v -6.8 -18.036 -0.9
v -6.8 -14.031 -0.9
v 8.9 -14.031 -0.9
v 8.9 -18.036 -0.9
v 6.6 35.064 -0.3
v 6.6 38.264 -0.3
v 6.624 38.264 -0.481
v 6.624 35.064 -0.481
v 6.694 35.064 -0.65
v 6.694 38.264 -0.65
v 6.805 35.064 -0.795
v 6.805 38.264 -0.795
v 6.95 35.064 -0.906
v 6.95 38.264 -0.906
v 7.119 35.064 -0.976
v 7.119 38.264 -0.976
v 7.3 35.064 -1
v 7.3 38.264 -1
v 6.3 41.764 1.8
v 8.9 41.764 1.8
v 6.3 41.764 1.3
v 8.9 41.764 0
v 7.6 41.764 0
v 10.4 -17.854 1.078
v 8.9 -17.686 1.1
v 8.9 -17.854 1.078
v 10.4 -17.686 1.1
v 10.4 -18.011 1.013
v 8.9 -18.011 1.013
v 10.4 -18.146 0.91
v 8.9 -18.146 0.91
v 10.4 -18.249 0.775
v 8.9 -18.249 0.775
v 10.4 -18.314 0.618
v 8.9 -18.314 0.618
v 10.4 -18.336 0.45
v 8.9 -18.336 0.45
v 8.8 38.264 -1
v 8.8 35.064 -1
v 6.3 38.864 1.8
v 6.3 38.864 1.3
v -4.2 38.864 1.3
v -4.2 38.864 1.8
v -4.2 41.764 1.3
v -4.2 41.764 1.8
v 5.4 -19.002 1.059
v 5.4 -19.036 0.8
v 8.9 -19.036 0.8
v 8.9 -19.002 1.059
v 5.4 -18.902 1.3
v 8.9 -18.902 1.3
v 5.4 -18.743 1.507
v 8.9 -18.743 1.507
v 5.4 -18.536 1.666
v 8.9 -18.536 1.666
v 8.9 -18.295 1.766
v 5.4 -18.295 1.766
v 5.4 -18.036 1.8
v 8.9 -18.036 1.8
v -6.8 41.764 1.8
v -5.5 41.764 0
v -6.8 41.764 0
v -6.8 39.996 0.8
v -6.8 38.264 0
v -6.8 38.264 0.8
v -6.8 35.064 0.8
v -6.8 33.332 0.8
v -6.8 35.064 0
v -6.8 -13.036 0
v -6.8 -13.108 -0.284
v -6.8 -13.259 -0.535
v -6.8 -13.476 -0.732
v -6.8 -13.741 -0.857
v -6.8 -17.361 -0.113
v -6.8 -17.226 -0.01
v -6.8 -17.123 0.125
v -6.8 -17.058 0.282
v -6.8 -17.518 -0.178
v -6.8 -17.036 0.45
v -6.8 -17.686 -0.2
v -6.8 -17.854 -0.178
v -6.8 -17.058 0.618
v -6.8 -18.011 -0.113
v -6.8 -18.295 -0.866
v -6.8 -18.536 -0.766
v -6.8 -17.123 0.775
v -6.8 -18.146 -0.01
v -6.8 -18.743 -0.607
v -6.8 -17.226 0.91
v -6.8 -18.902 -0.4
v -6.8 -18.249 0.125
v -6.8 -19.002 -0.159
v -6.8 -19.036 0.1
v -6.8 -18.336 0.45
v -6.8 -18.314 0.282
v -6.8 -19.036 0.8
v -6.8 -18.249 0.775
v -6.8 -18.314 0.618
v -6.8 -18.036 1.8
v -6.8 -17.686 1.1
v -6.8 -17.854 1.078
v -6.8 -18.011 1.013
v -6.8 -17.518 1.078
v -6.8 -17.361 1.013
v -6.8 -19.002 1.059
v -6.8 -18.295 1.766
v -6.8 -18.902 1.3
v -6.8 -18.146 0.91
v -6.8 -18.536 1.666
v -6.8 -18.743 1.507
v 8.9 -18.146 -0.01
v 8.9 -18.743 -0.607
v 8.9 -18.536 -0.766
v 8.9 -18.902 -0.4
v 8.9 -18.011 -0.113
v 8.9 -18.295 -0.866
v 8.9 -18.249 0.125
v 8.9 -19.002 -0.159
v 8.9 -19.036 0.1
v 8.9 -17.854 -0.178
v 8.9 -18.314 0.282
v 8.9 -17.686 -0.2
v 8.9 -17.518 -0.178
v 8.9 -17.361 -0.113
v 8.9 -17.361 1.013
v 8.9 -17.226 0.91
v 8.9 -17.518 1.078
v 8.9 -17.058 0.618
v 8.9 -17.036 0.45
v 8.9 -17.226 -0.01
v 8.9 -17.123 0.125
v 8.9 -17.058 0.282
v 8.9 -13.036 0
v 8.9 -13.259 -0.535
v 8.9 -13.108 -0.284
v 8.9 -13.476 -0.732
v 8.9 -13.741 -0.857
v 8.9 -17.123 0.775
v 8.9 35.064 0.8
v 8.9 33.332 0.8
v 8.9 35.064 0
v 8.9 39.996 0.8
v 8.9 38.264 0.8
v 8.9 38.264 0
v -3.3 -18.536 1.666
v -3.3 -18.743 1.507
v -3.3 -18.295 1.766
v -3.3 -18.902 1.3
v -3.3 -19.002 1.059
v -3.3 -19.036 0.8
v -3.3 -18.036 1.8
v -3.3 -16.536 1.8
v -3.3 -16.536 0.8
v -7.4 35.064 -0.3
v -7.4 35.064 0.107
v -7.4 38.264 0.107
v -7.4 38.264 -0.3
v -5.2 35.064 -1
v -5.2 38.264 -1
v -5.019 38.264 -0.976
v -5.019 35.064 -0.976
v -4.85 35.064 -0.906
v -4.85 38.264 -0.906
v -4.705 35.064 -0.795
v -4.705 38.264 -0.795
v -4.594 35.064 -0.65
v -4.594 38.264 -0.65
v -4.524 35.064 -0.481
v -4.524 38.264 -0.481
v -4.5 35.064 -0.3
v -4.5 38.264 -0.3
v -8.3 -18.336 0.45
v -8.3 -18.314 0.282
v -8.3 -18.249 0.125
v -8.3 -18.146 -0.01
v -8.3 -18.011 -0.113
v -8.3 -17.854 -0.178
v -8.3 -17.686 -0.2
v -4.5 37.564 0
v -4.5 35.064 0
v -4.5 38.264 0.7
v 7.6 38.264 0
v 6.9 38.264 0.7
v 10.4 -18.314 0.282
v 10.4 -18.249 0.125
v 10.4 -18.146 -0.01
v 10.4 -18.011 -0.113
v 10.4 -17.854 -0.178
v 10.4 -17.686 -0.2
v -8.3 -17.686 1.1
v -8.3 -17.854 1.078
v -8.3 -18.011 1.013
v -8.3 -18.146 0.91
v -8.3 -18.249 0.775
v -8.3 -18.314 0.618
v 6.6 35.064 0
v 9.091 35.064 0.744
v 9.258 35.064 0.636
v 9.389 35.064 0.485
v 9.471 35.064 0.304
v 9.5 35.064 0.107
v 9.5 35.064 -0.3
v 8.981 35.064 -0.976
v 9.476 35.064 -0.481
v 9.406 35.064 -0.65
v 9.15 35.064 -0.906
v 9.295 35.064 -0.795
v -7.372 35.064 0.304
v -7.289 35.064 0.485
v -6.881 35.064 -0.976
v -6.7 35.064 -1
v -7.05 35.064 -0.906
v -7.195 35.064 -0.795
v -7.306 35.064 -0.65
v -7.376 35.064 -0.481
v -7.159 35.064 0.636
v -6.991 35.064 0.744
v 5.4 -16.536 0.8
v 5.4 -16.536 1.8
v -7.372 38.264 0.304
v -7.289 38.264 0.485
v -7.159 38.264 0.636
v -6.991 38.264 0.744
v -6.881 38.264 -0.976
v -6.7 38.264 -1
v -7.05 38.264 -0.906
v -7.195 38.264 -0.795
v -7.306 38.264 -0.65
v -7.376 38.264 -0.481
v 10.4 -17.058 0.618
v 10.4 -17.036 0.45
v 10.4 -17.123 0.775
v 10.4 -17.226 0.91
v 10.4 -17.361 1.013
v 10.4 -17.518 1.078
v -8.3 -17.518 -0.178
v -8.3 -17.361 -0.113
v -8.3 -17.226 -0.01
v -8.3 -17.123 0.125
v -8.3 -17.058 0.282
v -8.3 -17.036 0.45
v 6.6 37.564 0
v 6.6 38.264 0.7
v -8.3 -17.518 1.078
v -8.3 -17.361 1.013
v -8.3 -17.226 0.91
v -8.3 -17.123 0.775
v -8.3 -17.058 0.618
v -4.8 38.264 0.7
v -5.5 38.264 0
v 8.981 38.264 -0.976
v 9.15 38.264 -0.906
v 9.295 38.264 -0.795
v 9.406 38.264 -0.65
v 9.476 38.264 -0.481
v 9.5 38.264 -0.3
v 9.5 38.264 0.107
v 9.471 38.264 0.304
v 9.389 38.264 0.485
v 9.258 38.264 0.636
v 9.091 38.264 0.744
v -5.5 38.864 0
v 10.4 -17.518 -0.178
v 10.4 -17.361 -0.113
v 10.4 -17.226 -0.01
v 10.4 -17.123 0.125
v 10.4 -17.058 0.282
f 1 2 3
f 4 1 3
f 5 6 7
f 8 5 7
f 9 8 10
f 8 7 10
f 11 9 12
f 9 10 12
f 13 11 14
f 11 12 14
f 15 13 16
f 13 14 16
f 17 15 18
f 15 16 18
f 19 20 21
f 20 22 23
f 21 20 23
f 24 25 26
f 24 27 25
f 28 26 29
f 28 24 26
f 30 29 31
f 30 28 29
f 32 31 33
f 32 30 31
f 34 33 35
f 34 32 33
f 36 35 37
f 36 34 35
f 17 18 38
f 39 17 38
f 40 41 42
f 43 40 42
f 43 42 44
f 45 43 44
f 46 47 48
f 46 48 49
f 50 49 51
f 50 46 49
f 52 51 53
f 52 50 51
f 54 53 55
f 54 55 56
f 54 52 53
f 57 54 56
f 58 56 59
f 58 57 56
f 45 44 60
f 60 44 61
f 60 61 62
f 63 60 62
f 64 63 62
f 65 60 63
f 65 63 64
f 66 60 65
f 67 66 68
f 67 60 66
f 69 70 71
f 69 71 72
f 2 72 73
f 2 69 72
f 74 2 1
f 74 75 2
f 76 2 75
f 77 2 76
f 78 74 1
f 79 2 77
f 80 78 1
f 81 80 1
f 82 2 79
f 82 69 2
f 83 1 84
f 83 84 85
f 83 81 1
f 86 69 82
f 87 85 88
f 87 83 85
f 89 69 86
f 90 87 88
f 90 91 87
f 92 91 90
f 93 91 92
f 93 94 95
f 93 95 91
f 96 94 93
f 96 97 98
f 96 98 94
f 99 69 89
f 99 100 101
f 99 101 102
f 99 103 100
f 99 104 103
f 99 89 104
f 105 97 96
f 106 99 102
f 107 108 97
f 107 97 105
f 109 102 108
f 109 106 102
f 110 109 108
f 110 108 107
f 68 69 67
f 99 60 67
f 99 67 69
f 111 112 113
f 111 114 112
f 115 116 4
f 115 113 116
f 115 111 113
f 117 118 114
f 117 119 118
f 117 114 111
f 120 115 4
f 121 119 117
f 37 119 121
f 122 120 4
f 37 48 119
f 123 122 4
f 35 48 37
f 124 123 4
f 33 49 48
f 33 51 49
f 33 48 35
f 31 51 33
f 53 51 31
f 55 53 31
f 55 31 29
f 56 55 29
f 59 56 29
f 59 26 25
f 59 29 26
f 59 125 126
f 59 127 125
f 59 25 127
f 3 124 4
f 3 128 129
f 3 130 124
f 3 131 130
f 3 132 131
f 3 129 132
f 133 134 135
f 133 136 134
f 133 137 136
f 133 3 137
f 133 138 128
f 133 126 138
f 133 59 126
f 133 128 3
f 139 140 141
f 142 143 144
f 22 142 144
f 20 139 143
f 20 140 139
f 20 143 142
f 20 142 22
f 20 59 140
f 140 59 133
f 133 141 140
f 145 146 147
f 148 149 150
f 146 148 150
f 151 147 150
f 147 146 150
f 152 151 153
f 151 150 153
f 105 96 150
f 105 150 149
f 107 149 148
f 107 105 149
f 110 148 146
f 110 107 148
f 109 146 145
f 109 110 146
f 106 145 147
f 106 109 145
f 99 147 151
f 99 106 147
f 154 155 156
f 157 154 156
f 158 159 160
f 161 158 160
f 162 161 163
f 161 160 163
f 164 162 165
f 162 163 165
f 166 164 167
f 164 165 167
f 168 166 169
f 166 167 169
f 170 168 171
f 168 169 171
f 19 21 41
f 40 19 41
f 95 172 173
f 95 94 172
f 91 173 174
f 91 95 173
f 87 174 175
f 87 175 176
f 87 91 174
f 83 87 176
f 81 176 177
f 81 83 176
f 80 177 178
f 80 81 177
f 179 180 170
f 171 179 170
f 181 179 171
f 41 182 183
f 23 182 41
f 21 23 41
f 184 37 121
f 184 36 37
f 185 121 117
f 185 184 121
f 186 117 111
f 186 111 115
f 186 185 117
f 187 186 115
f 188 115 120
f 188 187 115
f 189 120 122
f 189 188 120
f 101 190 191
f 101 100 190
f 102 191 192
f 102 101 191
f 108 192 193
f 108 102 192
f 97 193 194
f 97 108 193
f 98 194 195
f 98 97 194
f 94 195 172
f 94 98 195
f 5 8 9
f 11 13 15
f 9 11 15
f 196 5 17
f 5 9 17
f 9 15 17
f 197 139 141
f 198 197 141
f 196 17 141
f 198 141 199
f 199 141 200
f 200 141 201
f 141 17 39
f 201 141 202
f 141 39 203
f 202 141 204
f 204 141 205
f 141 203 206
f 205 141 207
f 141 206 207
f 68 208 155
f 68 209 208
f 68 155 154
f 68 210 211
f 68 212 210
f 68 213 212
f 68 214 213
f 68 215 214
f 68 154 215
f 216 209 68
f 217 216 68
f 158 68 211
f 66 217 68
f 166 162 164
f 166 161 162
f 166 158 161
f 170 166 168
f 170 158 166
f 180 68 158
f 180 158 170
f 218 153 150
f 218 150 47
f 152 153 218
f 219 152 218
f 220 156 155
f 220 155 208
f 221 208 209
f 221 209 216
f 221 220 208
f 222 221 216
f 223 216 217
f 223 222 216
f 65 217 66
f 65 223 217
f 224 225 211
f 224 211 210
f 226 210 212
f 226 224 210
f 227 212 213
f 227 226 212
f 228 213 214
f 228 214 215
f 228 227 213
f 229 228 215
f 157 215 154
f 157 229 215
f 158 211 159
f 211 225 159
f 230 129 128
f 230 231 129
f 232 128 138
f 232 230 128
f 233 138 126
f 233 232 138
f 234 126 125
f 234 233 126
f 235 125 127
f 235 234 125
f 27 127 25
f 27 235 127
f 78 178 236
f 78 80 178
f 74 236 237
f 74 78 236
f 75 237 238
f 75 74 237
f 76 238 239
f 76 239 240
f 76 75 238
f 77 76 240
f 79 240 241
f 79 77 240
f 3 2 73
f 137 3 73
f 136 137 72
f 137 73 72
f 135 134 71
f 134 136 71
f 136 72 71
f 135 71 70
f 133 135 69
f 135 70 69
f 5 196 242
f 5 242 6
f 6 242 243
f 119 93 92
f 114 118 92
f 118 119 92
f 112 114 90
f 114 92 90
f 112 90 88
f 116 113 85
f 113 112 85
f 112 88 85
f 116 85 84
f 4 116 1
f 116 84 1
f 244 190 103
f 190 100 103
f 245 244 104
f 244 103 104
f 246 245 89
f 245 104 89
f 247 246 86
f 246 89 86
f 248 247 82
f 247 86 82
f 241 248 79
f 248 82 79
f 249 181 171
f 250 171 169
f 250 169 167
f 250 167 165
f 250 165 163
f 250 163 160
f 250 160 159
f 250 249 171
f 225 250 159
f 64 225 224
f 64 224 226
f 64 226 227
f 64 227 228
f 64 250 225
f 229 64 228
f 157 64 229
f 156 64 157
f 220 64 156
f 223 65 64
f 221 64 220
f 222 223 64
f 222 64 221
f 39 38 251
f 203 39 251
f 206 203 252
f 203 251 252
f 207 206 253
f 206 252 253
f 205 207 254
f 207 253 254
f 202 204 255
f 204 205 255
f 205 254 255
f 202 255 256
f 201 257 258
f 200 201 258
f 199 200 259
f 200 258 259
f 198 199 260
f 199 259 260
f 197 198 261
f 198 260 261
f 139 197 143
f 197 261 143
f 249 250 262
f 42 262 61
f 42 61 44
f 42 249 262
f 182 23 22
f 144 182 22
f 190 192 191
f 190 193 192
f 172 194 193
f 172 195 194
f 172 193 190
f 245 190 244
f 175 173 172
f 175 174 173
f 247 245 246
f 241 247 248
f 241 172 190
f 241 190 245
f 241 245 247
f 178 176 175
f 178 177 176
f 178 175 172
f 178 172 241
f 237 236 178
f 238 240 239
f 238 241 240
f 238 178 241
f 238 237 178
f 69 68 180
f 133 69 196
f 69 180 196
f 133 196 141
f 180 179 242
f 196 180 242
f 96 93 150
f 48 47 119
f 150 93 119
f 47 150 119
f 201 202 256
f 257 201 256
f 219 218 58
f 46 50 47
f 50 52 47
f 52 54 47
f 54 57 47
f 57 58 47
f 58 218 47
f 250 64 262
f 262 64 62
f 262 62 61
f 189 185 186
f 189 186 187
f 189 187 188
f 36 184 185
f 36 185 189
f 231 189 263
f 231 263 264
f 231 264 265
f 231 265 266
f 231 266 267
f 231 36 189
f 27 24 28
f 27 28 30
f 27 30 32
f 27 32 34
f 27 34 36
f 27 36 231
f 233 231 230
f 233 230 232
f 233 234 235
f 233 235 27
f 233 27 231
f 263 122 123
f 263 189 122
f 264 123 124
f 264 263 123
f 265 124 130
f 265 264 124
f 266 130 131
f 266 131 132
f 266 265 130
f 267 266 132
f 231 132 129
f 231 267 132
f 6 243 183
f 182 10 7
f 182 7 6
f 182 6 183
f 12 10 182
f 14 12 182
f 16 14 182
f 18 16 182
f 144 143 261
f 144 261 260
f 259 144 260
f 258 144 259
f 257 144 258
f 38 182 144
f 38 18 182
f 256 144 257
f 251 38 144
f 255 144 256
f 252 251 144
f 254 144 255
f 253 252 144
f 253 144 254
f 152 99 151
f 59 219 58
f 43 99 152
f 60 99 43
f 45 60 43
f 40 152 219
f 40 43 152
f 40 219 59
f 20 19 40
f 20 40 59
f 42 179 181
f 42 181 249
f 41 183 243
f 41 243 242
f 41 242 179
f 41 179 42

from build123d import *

# Parameters (mm, degrees)
F0_W         = 2.3
F0_H         = 3.2
F1_DEPTH     = 1.8
F0_W_2       = 8.7
F0_H_2       = 2.5
F2_DEPTH     = 0.9
F0_W_3       = 0.6
F3_DEPTH     = 1
F4_DEPTH     = 0.8
F5_DEPTH     = 0.8
F6_T4_DEPTH  = 9.5863757687
F6_T10_DEPTH = 9.5863757687
F6_T16_DEPTH = 17.1863757687
F6_T23_DEPTH = 17.1863757687
F6_T31_DEPTH = 9.5863757687
F6_T37_DEPTH = 9.5863757687
F7_T1_DEPTH  = 6.6641016151
F7_T3_DEPTH  = 6.7
F8_T1_DEPTH  = 8.5
F8_T3_DEPTH  = 20.7
F8_T5_DEPTH  = 8.5
F8_T7_DEPTH  = 20.6749371855
F0_W_4       = 1.5
F0_H_3       = 1.3
F9_DEPTH     = 0.2
F10_DEPTH    = 1.1
F11_R        = 0.64999
F12_R        = 0.64999


# Not quite as in the source:
# - a fillet or chamfer that OpenCascade refuses, or shapes differently, is made with other operations: its cross-section is extruded or revolved along the edge and cut away or added
# - a fillet or chamfer is up to 0.001 mm smaller than in the source, because OpenCascade refuses the exact size


with BuildPart() as f1:
    # F0 (on Top) → F1 (new body)
    with BuildSketch(Plane.XY):
        Polygon((8.8998297817, -13.0360927206), (-6.8001702183, -13.0360927206), (-6.8001702183, -16.0360927206), (-6.8001702183, -17.0360927206), (-6.8001702183, -18.3360927206), (-6.8001702183, -19.0360927206), (-3.3001702183, -19.0360927206), (-3.3001702183, -16.5360927206), (5.3998297817, -16.5360927206), (5.3998297817, -19.0360927206), (8.8998297817, -19.0360927206), (8.8998297817, -18.3360927206), (8.8998297817, -17.0360927206), align=None)
        Polygon((-4.2001702183, 41.7639072794), (-6.8001702183, 41.7639072794), (-6.8001702183, 38.2639072794), (-4.5001702183, 38.2639072794), (-4.5001702183, 35.0639072794), (-6.8001702183, 35.0639072794), (-6.8001702183, -13.0360927206), (8.8998297817, -13.0360927206), (8.8998297817, 35.0639072794), (6.5998297817, 35.0639072794), (6.5998297817, 38.2639072794), (8.8998297817, 38.2639072794), (8.8998297817, 41.7639072794), (6.2998297817, 41.7639072794), (6.2998297817, 38.8639072794), (-4.2001702183, 38.8639072794), align=None)
        with Locations((7.7498297817, 36.6639072794)):
            Rectangle(F0_W, F0_H)
        with Locations((-5.6501702183, 36.6639072794)):
            Rectangle(F0_W, F0_H)
    extrude(amount=F1_DEPTH)

    # F0 (on Top) → F2 (join)
    with BuildSketch(Plane.XY):
        with Locations((1.0498297817, -17.7860927206)):
            Rectangle(F0_W_2, F0_H_2)
        Polygon((8.8998297817, -13.0360927206), (-6.8001702183, -13.0360927206), (-6.8001702183, -16.0360927206), (-6.8001702183, -17.0360927206), (-6.8001702183, -18.3360927206), (-6.8001702183, -19.0360927206), (-3.3001702183, -19.0360927206), (-3.3001702183, -16.5360927206), (5.3998297817, -16.5360927206), (5.3998297817, -19.0360927206), (8.8998297817, -19.0360927206), (8.8998297817, -18.3360927206), (8.8998297817, -17.0360927206), align=None)
    extrude(amount=-F2_DEPTH)

    # F0 (on Top) → F3 (join)
    with BuildSketch(Plane.XY):
        with Locations((7.7498297817, 36.6639072794)):
            Rectangle(F0_W, F0_H)
        with Locations((9.1998297817, 36.6639072794)):
            Rectangle(F0_W_3, F0_H)
        with Locations((-5.6501702183, 36.6639072794)):
            Rectangle(F0_W, F0_H)
        with Locations((-7.1001702183, 36.6639072794)):
            Rectangle(F0_W_3, F0_H)
    extrude(amount=-F3_DEPTH)

    # F0 (on Top) → F4 (join)
    with BuildSketch(Plane.XY):
        with Locations((9.1998297817, 36.6639072794)):
            Rectangle(F0_W_3, F0_H)
        with Locations((-7.1001702183, 36.6639072794)):
            Rectangle(F0_W_3, F0_H)
    extrude(amount=F4_DEPTH)

    # F0 (on Top) → F5 (join)
    with BuildSketch(Plane.XY):
        with Locations((1.0498297817, -17.7860927206)):
            Rectangle(F0_W_2, F0_H_2)
    extrude(amount=F5_DEPTH)

    # F6: chamfer of 1.3 on 3 edges, made by hand


with BuildPart() as f6_tool2:
    # F6_s3 → F6_t4 (new body)
    with BuildSketch(Plane.XZ.offset(-45.1070951637)):
        Polygon((7.5998297817, 0), (6.2998297817, 1.3), (6.2998297817, 0), align=None)
    extrude(amount=F6_T4_DEPTH)

    split(bisect_by=Plane.XZ.offset(-38.2639072794), keep=Keep.BOTTOM)

    split(bisect_by=Plane(origin=(0, 18.7819536397, -18.7819536397), x_dir=(1, 0, 0), z_dir=(0, 0.7071067812, -0.7071067812)), keep=Keep.TOP)


with BuildPart() as f1_1:
    add(f1.part)

    # F6_t1: cut F6_tool2
    add(f6_tool2.part, mode=Mode.SUBTRACT)


with BuildPart() as f6_tool8:
    # F6_s9 → F6_t10 (new body)
    with BuildSketch(Plane.XZ.offset(-45.1070951637)):
        Polygon((7.5998297817, 0), (6.2998297817, 1.3), (6.2998297817, 0), align=None)
    extrude(amount=F6_T10_DEPTH)

    split(bisect_by=Plane.YZ.offset(6.5998297817), keep=Keep.BOTTOM)

    split(bisect_by=Plane(origin=(0, 18.7819536397, -18.7819536397), x_dir=(1, 0, 0), z_dir=(0, 0.7071067812, -0.7071067812)), keep=Keep.TOP)


with BuildPart() as f1_2:
    add(f1_1.part)

    # F6_t7: cut F6_tool8
    add(f6_tool8.part, mode=Mode.SUBTRACT)


with BuildPart() as f6_tool14:
    # F6_s15 → F6_t16 (new body)
    with BuildSketch(Plane.YZ.offset(9.6430176661)):
        Polygon((37.5639072794, 0), (38.8639072794, 1.3), (38.8639072794, 0), align=None)
    extrude(amount=-F6_T16_DEPTH)

    split(bisect_by=Plane.XZ.offset(-38.2639072794), keep=Keep.BOTTOM)

    split(bisect_by=Plane(origin=(-2.7500851092, 0, 2.7500851092), x_dir=(0, 1, 0), z_dir=(0.7071067812, 0, -0.7071067812)), keep=Keep.TOP)

    split(bisect_by=Plane(origin=(3.7999148908, 0, 3.7999148908), x_dir=(0, 1, 0), z_dir=(-0.7071067812, 0, -0.7071067812)), keep=Keep.TOP)


with BuildPart() as f1_3:
    add(f1_2.part)

    # F6_t13: cut F6_tool14
    add(f6_tool14.part, mode=Mode.SUBTRACT)


with BuildPart() as f6_tool21:
    # F6_s22 → F6_t23 (new body)
    with BuildSketch(Plane.YZ.offset(9.6430176661)):
        Polygon((37.5639072794, 0), (38.8639072794, 1.3), (38.8639072794, 0), align=None)
    extrude(amount=-F6_T23_DEPTH)

    split(bisect_by=Plane.YZ.offset(6.5998297817), keep=Keep.BOTTOM)

    split(bisect_by=Plane.YZ.offset(-4.5001702183), keep=Keep.TOP)

    split(bisect_by=Plane(origin=(-2.7500851092, 0, 2.7500851092), x_dir=(0, 1, 0), z_dir=(0.7071067812, 0, -0.7071067812)), keep=Keep.TOP)

    split(bisect_by=Plane(origin=(3.7999148908, 0, 3.7999148908), x_dir=(0, 1, 0), z_dir=(-0.7071067812, 0, -0.7071067812)), keep=Keep.TOP)


with BuildPart() as f1_4:
    add(f1_3.part)

    # F6_t20: cut F6_tool21
    add(f6_tool21.part, mode=Mode.SUBTRACT)


with BuildPart() as f6_tool29:
    # F6_s30 → F6_t31 (new body)
    with BuildSketch(Plane.XZ.offset(-35.520719395)):
        Polygon((-5.5001702183, 0), (-4.2001702183, 1.3), (-4.2001702183, 0), align=None)
    extrude(amount=-F6_T31_DEPTH)

    split(bisect_by=Plane.YZ.offset(-4.5001702183), keep=Keep.TOP)

    split(bisect_by=Plane(origin=(0, 18.7819536397, -18.7819536397), x_dir=(1, 0, 0), z_dir=(0, 0.7071067812, -0.7071067812)), keep=Keep.TOP)


with BuildPart() as f1_5:
    add(f1_4.part)

    # F6_t28: cut F6_tool29
    add(f6_tool29.part, mode=Mode.SUBTRACT)


with BuildPart() as f6_tool35:
    # F6_s36 → F6_t37 (new body)
    with BuildSketch(Plane.XZ.offset(-35.520719395)):
        Polygon((-5.5001702183, 0), (-4.2001702183, 1.3), (-4.2001702183, 0), align=None)
    extrude(amount=-F6_T37_DEPTH)

    split(bisect_by=Plane.XZ.offset(-38.2639072794), keep=Keep.BOTTOM)

    split(bisect_by=Plane(origin=(0, 18.7819536397, -18.7819536397), x_dir=(1, 0, 0), z_dir=(0, 0.7071067812, -0.7071067812)), keep=Keep.TOP)


with BuildPart() as f1_6:
    add(f1_5.part)

    # F6_t34: cut F6_tool35
    add(f6_tool35.part, mode=Mode.SUBTRACT)

    # F7: fillet of radius 0.7 on 6 edges, made by hand

    # F7_s2 → F7_t1 (cut)
    with BuildSketch(Plane.XZ.offset(-39.9959580869)):
        with BuildLine():
            ThreePointArc((-7.4001702183, 0.107179677), (-7.2293204805, 0.5654372465), (-6.8001702183, 0.8))
            Line((-6.8001702183, 0.8), (-7.4001702183, 0.8))
            Line((-7.4001702183, 0.8), (-7.4001702183, 0.107179677))
        make_face()
        with BuildLine():
            ThreePointArc((9.4998297817, 0.107179677), (9.3289800439, 0.5654372465), (8.8998297817, 0.8))
            Line((8.8998297817, 0.8), (9.4998297817, 0.8))
            Line((9.4998297817, 0.8), (9.4998297817, 0.107179677))
        make_face()
    extrude(amount=F7_T1_DEPTH, mode=Mode.SUBTRACT)

    # F7_s4 → F7_t3 (cut)
    with BuildSketch(Plane.XZ.offset(-40.0139072794)):
        with BuildLine():
            ThreePointArc((-6.7001702183, -1), (-7.1951449651, -0.7949747468), (-7.4001702183, -0.3))
            Line((-7.4001702183, -0.3), (-7.4001702183, -1))
            Line((-7.4001702183, -1), (-6.7001702183, -1))
        make_face()
        with BuildLine():
            ThreePointArc((-5.2001702183, -1), (-4.7051954715, -0.7949747468), (-4.5001702183, -0.3))
            Line((-4.5001702183, -0.3), (-4.5001702183, -1))
            Line((-4.5001702183, -1), (-5.2001702183, -1))
        make_face()
        with BuildLine():
            ThreePointArc((6.5998297817, -0.3), (6.8048550349, -0.7949747468), (7.2998297817, -1))
            Line((7.2998297817, -1), (6.5998297817, -1))
            Line((6.5998297817, -1), (6.5998297817, -0.3))
        make_face()
        with BuildLine():
            ThreePointArc((8.7998297817, -1), (9.2948045285, -0.7949747468), (9.4998297817, -0.3))
            Line((9.4998297817, -0.3), (9.4998297817, -1))
            Line((9.4998297817, -1), (8.7998297817, -1))
        make_face()
    extrude(amount=F7_T3_DEPTH, mode=Mode.SUBTRACT)

    # F8: fillet of radius 1 on 4 edges, made by hand

    # F8_s2 → F8_t1 (cut)
    with BuildSketch(Plane.YZ.offset(-9.3001702183)):
        with BuildLine():
            ThreePointArc((-19.0360927206, 0.8), (-18.7431995018, 1.5071067812), (-18.0360927206, 1.8))
            Line((-18.0360927206, 1.8), (-19.0360927206, 1.8))
            Line((-19.0360927206, 1.8), (-19.0360927206, 0.8))
        make_face()
    extrude(amount=F8_T1_DEPTH, mode=Mode.SUBTRACT)

    # F8_s4 → F8_t3 (cut)
    with BuildSketch(Plane.YZ.offset(-9.3001702183)):
        with BuildLine():
            ThreePointArc((-19.0360927206, 0.1), (-18.7431995018, -0.6071067812), (-18.0360927206, -0.9))
            Line((-18.0360927206, -0.9), (-19.0360927206, -0.9))
            Line((-19.0360927206, -0.9), (-19.0360927206, 0.1))
        make_face()
    extrude(amount=F8_T3_DEPTH, mode=Mode.SUBTRACT)

    # F8_s6 → F8_t5 (cut)
    with BuildSketch(Plane.YZ.offset(2.8998297817)):
        with BuildLine():
            ThreePointArc((-19.0360927206, 0.8), (-18.7431995018, 1.5071067812), (-18.0360927206, 1.8))
            Line((-18.0360927206, 1.8), (-19.0360927206, 1.8))
            Line((-19.0360927206, 1.8), (-19.0360927206, 0.8))
        make_face()
    extrude(amount=F8_T5_DEPTH, mode=Mode.SUBTRACT)

    # F8_s8 → F8_t7 (cut)
    with BuildSketch(Plane.YZ.offset(-9.2876388111)):
        with BuildLine():
            ThreePointArc((-14.0310801578, -0.9), (-13.3602597645, -0.6416198487), (-13.0360927206, 0))
            Line((-13.0360927206, 0), (-13.0360927206, -0.9))
            Line((-13.0360927206, -0.9), (-14.0310801578, -0.9))
        make_face()
    extrude(amount=F8_T7_DEPTH, mode=Mode.SUBTRACT)

    # F0 (on Top) → F9 (join)
    with BuildSketch(Plane.XY):
        with Locations((-7.5501702183, -17.6860927206)):
            Rectangle(F0_W_4, F0_H_3)
        with Locations((9.6498297817, -17.6860927206)):
            Rectangle(F0_W_4, F0_H_3)
    extrude(amount=-F9_DEPTH)

    # F0 (on Top) → F10 (join)
    with BuildSketch(Plane.XY):
        with Locations((-7.5501702183, -17.6860927206)):
            Rectangle(F0_W_4, F0_H_3)
        with Locations((9.6498297817, -17.6860927206)):
            Rectangle(F0_W_4, F0_H_3)
    extrude(amount=F10_DEPTH)

    # F11 (radius 0.65 in the source; OpenCascade refuses exactly that, so slightly less here)
    f11_edges = [f1_6.edges().sort_by_distance(p)[0] for p in [
        (9.64983, -17.036093, 1.1),
        (9.64983, -18.336093, 1.1),
    ]]
    fillet(f11_edges, radius=F11_R)

    # F12 (radius 0.65 in the source; OpenCascade refuses exactly that, so slightly less here)
    f12_edges = [f1_6.edges().sort_by_distance(p)[0] for p in [
        (9.64983, -18.336093, -0.2),
        (9.64983, -17.036093, -0.2),
        (-7.55017, -18.336093, -0.2),
        (-7.55017, -17.036093, -0.2),
        (-7.55017, -18.336093, 1.1),
        (-7.55017, -17.036093, 1.1),
    ]]
    fillet(f12_edges, radius=F12_R)


solid = f1_6.part
